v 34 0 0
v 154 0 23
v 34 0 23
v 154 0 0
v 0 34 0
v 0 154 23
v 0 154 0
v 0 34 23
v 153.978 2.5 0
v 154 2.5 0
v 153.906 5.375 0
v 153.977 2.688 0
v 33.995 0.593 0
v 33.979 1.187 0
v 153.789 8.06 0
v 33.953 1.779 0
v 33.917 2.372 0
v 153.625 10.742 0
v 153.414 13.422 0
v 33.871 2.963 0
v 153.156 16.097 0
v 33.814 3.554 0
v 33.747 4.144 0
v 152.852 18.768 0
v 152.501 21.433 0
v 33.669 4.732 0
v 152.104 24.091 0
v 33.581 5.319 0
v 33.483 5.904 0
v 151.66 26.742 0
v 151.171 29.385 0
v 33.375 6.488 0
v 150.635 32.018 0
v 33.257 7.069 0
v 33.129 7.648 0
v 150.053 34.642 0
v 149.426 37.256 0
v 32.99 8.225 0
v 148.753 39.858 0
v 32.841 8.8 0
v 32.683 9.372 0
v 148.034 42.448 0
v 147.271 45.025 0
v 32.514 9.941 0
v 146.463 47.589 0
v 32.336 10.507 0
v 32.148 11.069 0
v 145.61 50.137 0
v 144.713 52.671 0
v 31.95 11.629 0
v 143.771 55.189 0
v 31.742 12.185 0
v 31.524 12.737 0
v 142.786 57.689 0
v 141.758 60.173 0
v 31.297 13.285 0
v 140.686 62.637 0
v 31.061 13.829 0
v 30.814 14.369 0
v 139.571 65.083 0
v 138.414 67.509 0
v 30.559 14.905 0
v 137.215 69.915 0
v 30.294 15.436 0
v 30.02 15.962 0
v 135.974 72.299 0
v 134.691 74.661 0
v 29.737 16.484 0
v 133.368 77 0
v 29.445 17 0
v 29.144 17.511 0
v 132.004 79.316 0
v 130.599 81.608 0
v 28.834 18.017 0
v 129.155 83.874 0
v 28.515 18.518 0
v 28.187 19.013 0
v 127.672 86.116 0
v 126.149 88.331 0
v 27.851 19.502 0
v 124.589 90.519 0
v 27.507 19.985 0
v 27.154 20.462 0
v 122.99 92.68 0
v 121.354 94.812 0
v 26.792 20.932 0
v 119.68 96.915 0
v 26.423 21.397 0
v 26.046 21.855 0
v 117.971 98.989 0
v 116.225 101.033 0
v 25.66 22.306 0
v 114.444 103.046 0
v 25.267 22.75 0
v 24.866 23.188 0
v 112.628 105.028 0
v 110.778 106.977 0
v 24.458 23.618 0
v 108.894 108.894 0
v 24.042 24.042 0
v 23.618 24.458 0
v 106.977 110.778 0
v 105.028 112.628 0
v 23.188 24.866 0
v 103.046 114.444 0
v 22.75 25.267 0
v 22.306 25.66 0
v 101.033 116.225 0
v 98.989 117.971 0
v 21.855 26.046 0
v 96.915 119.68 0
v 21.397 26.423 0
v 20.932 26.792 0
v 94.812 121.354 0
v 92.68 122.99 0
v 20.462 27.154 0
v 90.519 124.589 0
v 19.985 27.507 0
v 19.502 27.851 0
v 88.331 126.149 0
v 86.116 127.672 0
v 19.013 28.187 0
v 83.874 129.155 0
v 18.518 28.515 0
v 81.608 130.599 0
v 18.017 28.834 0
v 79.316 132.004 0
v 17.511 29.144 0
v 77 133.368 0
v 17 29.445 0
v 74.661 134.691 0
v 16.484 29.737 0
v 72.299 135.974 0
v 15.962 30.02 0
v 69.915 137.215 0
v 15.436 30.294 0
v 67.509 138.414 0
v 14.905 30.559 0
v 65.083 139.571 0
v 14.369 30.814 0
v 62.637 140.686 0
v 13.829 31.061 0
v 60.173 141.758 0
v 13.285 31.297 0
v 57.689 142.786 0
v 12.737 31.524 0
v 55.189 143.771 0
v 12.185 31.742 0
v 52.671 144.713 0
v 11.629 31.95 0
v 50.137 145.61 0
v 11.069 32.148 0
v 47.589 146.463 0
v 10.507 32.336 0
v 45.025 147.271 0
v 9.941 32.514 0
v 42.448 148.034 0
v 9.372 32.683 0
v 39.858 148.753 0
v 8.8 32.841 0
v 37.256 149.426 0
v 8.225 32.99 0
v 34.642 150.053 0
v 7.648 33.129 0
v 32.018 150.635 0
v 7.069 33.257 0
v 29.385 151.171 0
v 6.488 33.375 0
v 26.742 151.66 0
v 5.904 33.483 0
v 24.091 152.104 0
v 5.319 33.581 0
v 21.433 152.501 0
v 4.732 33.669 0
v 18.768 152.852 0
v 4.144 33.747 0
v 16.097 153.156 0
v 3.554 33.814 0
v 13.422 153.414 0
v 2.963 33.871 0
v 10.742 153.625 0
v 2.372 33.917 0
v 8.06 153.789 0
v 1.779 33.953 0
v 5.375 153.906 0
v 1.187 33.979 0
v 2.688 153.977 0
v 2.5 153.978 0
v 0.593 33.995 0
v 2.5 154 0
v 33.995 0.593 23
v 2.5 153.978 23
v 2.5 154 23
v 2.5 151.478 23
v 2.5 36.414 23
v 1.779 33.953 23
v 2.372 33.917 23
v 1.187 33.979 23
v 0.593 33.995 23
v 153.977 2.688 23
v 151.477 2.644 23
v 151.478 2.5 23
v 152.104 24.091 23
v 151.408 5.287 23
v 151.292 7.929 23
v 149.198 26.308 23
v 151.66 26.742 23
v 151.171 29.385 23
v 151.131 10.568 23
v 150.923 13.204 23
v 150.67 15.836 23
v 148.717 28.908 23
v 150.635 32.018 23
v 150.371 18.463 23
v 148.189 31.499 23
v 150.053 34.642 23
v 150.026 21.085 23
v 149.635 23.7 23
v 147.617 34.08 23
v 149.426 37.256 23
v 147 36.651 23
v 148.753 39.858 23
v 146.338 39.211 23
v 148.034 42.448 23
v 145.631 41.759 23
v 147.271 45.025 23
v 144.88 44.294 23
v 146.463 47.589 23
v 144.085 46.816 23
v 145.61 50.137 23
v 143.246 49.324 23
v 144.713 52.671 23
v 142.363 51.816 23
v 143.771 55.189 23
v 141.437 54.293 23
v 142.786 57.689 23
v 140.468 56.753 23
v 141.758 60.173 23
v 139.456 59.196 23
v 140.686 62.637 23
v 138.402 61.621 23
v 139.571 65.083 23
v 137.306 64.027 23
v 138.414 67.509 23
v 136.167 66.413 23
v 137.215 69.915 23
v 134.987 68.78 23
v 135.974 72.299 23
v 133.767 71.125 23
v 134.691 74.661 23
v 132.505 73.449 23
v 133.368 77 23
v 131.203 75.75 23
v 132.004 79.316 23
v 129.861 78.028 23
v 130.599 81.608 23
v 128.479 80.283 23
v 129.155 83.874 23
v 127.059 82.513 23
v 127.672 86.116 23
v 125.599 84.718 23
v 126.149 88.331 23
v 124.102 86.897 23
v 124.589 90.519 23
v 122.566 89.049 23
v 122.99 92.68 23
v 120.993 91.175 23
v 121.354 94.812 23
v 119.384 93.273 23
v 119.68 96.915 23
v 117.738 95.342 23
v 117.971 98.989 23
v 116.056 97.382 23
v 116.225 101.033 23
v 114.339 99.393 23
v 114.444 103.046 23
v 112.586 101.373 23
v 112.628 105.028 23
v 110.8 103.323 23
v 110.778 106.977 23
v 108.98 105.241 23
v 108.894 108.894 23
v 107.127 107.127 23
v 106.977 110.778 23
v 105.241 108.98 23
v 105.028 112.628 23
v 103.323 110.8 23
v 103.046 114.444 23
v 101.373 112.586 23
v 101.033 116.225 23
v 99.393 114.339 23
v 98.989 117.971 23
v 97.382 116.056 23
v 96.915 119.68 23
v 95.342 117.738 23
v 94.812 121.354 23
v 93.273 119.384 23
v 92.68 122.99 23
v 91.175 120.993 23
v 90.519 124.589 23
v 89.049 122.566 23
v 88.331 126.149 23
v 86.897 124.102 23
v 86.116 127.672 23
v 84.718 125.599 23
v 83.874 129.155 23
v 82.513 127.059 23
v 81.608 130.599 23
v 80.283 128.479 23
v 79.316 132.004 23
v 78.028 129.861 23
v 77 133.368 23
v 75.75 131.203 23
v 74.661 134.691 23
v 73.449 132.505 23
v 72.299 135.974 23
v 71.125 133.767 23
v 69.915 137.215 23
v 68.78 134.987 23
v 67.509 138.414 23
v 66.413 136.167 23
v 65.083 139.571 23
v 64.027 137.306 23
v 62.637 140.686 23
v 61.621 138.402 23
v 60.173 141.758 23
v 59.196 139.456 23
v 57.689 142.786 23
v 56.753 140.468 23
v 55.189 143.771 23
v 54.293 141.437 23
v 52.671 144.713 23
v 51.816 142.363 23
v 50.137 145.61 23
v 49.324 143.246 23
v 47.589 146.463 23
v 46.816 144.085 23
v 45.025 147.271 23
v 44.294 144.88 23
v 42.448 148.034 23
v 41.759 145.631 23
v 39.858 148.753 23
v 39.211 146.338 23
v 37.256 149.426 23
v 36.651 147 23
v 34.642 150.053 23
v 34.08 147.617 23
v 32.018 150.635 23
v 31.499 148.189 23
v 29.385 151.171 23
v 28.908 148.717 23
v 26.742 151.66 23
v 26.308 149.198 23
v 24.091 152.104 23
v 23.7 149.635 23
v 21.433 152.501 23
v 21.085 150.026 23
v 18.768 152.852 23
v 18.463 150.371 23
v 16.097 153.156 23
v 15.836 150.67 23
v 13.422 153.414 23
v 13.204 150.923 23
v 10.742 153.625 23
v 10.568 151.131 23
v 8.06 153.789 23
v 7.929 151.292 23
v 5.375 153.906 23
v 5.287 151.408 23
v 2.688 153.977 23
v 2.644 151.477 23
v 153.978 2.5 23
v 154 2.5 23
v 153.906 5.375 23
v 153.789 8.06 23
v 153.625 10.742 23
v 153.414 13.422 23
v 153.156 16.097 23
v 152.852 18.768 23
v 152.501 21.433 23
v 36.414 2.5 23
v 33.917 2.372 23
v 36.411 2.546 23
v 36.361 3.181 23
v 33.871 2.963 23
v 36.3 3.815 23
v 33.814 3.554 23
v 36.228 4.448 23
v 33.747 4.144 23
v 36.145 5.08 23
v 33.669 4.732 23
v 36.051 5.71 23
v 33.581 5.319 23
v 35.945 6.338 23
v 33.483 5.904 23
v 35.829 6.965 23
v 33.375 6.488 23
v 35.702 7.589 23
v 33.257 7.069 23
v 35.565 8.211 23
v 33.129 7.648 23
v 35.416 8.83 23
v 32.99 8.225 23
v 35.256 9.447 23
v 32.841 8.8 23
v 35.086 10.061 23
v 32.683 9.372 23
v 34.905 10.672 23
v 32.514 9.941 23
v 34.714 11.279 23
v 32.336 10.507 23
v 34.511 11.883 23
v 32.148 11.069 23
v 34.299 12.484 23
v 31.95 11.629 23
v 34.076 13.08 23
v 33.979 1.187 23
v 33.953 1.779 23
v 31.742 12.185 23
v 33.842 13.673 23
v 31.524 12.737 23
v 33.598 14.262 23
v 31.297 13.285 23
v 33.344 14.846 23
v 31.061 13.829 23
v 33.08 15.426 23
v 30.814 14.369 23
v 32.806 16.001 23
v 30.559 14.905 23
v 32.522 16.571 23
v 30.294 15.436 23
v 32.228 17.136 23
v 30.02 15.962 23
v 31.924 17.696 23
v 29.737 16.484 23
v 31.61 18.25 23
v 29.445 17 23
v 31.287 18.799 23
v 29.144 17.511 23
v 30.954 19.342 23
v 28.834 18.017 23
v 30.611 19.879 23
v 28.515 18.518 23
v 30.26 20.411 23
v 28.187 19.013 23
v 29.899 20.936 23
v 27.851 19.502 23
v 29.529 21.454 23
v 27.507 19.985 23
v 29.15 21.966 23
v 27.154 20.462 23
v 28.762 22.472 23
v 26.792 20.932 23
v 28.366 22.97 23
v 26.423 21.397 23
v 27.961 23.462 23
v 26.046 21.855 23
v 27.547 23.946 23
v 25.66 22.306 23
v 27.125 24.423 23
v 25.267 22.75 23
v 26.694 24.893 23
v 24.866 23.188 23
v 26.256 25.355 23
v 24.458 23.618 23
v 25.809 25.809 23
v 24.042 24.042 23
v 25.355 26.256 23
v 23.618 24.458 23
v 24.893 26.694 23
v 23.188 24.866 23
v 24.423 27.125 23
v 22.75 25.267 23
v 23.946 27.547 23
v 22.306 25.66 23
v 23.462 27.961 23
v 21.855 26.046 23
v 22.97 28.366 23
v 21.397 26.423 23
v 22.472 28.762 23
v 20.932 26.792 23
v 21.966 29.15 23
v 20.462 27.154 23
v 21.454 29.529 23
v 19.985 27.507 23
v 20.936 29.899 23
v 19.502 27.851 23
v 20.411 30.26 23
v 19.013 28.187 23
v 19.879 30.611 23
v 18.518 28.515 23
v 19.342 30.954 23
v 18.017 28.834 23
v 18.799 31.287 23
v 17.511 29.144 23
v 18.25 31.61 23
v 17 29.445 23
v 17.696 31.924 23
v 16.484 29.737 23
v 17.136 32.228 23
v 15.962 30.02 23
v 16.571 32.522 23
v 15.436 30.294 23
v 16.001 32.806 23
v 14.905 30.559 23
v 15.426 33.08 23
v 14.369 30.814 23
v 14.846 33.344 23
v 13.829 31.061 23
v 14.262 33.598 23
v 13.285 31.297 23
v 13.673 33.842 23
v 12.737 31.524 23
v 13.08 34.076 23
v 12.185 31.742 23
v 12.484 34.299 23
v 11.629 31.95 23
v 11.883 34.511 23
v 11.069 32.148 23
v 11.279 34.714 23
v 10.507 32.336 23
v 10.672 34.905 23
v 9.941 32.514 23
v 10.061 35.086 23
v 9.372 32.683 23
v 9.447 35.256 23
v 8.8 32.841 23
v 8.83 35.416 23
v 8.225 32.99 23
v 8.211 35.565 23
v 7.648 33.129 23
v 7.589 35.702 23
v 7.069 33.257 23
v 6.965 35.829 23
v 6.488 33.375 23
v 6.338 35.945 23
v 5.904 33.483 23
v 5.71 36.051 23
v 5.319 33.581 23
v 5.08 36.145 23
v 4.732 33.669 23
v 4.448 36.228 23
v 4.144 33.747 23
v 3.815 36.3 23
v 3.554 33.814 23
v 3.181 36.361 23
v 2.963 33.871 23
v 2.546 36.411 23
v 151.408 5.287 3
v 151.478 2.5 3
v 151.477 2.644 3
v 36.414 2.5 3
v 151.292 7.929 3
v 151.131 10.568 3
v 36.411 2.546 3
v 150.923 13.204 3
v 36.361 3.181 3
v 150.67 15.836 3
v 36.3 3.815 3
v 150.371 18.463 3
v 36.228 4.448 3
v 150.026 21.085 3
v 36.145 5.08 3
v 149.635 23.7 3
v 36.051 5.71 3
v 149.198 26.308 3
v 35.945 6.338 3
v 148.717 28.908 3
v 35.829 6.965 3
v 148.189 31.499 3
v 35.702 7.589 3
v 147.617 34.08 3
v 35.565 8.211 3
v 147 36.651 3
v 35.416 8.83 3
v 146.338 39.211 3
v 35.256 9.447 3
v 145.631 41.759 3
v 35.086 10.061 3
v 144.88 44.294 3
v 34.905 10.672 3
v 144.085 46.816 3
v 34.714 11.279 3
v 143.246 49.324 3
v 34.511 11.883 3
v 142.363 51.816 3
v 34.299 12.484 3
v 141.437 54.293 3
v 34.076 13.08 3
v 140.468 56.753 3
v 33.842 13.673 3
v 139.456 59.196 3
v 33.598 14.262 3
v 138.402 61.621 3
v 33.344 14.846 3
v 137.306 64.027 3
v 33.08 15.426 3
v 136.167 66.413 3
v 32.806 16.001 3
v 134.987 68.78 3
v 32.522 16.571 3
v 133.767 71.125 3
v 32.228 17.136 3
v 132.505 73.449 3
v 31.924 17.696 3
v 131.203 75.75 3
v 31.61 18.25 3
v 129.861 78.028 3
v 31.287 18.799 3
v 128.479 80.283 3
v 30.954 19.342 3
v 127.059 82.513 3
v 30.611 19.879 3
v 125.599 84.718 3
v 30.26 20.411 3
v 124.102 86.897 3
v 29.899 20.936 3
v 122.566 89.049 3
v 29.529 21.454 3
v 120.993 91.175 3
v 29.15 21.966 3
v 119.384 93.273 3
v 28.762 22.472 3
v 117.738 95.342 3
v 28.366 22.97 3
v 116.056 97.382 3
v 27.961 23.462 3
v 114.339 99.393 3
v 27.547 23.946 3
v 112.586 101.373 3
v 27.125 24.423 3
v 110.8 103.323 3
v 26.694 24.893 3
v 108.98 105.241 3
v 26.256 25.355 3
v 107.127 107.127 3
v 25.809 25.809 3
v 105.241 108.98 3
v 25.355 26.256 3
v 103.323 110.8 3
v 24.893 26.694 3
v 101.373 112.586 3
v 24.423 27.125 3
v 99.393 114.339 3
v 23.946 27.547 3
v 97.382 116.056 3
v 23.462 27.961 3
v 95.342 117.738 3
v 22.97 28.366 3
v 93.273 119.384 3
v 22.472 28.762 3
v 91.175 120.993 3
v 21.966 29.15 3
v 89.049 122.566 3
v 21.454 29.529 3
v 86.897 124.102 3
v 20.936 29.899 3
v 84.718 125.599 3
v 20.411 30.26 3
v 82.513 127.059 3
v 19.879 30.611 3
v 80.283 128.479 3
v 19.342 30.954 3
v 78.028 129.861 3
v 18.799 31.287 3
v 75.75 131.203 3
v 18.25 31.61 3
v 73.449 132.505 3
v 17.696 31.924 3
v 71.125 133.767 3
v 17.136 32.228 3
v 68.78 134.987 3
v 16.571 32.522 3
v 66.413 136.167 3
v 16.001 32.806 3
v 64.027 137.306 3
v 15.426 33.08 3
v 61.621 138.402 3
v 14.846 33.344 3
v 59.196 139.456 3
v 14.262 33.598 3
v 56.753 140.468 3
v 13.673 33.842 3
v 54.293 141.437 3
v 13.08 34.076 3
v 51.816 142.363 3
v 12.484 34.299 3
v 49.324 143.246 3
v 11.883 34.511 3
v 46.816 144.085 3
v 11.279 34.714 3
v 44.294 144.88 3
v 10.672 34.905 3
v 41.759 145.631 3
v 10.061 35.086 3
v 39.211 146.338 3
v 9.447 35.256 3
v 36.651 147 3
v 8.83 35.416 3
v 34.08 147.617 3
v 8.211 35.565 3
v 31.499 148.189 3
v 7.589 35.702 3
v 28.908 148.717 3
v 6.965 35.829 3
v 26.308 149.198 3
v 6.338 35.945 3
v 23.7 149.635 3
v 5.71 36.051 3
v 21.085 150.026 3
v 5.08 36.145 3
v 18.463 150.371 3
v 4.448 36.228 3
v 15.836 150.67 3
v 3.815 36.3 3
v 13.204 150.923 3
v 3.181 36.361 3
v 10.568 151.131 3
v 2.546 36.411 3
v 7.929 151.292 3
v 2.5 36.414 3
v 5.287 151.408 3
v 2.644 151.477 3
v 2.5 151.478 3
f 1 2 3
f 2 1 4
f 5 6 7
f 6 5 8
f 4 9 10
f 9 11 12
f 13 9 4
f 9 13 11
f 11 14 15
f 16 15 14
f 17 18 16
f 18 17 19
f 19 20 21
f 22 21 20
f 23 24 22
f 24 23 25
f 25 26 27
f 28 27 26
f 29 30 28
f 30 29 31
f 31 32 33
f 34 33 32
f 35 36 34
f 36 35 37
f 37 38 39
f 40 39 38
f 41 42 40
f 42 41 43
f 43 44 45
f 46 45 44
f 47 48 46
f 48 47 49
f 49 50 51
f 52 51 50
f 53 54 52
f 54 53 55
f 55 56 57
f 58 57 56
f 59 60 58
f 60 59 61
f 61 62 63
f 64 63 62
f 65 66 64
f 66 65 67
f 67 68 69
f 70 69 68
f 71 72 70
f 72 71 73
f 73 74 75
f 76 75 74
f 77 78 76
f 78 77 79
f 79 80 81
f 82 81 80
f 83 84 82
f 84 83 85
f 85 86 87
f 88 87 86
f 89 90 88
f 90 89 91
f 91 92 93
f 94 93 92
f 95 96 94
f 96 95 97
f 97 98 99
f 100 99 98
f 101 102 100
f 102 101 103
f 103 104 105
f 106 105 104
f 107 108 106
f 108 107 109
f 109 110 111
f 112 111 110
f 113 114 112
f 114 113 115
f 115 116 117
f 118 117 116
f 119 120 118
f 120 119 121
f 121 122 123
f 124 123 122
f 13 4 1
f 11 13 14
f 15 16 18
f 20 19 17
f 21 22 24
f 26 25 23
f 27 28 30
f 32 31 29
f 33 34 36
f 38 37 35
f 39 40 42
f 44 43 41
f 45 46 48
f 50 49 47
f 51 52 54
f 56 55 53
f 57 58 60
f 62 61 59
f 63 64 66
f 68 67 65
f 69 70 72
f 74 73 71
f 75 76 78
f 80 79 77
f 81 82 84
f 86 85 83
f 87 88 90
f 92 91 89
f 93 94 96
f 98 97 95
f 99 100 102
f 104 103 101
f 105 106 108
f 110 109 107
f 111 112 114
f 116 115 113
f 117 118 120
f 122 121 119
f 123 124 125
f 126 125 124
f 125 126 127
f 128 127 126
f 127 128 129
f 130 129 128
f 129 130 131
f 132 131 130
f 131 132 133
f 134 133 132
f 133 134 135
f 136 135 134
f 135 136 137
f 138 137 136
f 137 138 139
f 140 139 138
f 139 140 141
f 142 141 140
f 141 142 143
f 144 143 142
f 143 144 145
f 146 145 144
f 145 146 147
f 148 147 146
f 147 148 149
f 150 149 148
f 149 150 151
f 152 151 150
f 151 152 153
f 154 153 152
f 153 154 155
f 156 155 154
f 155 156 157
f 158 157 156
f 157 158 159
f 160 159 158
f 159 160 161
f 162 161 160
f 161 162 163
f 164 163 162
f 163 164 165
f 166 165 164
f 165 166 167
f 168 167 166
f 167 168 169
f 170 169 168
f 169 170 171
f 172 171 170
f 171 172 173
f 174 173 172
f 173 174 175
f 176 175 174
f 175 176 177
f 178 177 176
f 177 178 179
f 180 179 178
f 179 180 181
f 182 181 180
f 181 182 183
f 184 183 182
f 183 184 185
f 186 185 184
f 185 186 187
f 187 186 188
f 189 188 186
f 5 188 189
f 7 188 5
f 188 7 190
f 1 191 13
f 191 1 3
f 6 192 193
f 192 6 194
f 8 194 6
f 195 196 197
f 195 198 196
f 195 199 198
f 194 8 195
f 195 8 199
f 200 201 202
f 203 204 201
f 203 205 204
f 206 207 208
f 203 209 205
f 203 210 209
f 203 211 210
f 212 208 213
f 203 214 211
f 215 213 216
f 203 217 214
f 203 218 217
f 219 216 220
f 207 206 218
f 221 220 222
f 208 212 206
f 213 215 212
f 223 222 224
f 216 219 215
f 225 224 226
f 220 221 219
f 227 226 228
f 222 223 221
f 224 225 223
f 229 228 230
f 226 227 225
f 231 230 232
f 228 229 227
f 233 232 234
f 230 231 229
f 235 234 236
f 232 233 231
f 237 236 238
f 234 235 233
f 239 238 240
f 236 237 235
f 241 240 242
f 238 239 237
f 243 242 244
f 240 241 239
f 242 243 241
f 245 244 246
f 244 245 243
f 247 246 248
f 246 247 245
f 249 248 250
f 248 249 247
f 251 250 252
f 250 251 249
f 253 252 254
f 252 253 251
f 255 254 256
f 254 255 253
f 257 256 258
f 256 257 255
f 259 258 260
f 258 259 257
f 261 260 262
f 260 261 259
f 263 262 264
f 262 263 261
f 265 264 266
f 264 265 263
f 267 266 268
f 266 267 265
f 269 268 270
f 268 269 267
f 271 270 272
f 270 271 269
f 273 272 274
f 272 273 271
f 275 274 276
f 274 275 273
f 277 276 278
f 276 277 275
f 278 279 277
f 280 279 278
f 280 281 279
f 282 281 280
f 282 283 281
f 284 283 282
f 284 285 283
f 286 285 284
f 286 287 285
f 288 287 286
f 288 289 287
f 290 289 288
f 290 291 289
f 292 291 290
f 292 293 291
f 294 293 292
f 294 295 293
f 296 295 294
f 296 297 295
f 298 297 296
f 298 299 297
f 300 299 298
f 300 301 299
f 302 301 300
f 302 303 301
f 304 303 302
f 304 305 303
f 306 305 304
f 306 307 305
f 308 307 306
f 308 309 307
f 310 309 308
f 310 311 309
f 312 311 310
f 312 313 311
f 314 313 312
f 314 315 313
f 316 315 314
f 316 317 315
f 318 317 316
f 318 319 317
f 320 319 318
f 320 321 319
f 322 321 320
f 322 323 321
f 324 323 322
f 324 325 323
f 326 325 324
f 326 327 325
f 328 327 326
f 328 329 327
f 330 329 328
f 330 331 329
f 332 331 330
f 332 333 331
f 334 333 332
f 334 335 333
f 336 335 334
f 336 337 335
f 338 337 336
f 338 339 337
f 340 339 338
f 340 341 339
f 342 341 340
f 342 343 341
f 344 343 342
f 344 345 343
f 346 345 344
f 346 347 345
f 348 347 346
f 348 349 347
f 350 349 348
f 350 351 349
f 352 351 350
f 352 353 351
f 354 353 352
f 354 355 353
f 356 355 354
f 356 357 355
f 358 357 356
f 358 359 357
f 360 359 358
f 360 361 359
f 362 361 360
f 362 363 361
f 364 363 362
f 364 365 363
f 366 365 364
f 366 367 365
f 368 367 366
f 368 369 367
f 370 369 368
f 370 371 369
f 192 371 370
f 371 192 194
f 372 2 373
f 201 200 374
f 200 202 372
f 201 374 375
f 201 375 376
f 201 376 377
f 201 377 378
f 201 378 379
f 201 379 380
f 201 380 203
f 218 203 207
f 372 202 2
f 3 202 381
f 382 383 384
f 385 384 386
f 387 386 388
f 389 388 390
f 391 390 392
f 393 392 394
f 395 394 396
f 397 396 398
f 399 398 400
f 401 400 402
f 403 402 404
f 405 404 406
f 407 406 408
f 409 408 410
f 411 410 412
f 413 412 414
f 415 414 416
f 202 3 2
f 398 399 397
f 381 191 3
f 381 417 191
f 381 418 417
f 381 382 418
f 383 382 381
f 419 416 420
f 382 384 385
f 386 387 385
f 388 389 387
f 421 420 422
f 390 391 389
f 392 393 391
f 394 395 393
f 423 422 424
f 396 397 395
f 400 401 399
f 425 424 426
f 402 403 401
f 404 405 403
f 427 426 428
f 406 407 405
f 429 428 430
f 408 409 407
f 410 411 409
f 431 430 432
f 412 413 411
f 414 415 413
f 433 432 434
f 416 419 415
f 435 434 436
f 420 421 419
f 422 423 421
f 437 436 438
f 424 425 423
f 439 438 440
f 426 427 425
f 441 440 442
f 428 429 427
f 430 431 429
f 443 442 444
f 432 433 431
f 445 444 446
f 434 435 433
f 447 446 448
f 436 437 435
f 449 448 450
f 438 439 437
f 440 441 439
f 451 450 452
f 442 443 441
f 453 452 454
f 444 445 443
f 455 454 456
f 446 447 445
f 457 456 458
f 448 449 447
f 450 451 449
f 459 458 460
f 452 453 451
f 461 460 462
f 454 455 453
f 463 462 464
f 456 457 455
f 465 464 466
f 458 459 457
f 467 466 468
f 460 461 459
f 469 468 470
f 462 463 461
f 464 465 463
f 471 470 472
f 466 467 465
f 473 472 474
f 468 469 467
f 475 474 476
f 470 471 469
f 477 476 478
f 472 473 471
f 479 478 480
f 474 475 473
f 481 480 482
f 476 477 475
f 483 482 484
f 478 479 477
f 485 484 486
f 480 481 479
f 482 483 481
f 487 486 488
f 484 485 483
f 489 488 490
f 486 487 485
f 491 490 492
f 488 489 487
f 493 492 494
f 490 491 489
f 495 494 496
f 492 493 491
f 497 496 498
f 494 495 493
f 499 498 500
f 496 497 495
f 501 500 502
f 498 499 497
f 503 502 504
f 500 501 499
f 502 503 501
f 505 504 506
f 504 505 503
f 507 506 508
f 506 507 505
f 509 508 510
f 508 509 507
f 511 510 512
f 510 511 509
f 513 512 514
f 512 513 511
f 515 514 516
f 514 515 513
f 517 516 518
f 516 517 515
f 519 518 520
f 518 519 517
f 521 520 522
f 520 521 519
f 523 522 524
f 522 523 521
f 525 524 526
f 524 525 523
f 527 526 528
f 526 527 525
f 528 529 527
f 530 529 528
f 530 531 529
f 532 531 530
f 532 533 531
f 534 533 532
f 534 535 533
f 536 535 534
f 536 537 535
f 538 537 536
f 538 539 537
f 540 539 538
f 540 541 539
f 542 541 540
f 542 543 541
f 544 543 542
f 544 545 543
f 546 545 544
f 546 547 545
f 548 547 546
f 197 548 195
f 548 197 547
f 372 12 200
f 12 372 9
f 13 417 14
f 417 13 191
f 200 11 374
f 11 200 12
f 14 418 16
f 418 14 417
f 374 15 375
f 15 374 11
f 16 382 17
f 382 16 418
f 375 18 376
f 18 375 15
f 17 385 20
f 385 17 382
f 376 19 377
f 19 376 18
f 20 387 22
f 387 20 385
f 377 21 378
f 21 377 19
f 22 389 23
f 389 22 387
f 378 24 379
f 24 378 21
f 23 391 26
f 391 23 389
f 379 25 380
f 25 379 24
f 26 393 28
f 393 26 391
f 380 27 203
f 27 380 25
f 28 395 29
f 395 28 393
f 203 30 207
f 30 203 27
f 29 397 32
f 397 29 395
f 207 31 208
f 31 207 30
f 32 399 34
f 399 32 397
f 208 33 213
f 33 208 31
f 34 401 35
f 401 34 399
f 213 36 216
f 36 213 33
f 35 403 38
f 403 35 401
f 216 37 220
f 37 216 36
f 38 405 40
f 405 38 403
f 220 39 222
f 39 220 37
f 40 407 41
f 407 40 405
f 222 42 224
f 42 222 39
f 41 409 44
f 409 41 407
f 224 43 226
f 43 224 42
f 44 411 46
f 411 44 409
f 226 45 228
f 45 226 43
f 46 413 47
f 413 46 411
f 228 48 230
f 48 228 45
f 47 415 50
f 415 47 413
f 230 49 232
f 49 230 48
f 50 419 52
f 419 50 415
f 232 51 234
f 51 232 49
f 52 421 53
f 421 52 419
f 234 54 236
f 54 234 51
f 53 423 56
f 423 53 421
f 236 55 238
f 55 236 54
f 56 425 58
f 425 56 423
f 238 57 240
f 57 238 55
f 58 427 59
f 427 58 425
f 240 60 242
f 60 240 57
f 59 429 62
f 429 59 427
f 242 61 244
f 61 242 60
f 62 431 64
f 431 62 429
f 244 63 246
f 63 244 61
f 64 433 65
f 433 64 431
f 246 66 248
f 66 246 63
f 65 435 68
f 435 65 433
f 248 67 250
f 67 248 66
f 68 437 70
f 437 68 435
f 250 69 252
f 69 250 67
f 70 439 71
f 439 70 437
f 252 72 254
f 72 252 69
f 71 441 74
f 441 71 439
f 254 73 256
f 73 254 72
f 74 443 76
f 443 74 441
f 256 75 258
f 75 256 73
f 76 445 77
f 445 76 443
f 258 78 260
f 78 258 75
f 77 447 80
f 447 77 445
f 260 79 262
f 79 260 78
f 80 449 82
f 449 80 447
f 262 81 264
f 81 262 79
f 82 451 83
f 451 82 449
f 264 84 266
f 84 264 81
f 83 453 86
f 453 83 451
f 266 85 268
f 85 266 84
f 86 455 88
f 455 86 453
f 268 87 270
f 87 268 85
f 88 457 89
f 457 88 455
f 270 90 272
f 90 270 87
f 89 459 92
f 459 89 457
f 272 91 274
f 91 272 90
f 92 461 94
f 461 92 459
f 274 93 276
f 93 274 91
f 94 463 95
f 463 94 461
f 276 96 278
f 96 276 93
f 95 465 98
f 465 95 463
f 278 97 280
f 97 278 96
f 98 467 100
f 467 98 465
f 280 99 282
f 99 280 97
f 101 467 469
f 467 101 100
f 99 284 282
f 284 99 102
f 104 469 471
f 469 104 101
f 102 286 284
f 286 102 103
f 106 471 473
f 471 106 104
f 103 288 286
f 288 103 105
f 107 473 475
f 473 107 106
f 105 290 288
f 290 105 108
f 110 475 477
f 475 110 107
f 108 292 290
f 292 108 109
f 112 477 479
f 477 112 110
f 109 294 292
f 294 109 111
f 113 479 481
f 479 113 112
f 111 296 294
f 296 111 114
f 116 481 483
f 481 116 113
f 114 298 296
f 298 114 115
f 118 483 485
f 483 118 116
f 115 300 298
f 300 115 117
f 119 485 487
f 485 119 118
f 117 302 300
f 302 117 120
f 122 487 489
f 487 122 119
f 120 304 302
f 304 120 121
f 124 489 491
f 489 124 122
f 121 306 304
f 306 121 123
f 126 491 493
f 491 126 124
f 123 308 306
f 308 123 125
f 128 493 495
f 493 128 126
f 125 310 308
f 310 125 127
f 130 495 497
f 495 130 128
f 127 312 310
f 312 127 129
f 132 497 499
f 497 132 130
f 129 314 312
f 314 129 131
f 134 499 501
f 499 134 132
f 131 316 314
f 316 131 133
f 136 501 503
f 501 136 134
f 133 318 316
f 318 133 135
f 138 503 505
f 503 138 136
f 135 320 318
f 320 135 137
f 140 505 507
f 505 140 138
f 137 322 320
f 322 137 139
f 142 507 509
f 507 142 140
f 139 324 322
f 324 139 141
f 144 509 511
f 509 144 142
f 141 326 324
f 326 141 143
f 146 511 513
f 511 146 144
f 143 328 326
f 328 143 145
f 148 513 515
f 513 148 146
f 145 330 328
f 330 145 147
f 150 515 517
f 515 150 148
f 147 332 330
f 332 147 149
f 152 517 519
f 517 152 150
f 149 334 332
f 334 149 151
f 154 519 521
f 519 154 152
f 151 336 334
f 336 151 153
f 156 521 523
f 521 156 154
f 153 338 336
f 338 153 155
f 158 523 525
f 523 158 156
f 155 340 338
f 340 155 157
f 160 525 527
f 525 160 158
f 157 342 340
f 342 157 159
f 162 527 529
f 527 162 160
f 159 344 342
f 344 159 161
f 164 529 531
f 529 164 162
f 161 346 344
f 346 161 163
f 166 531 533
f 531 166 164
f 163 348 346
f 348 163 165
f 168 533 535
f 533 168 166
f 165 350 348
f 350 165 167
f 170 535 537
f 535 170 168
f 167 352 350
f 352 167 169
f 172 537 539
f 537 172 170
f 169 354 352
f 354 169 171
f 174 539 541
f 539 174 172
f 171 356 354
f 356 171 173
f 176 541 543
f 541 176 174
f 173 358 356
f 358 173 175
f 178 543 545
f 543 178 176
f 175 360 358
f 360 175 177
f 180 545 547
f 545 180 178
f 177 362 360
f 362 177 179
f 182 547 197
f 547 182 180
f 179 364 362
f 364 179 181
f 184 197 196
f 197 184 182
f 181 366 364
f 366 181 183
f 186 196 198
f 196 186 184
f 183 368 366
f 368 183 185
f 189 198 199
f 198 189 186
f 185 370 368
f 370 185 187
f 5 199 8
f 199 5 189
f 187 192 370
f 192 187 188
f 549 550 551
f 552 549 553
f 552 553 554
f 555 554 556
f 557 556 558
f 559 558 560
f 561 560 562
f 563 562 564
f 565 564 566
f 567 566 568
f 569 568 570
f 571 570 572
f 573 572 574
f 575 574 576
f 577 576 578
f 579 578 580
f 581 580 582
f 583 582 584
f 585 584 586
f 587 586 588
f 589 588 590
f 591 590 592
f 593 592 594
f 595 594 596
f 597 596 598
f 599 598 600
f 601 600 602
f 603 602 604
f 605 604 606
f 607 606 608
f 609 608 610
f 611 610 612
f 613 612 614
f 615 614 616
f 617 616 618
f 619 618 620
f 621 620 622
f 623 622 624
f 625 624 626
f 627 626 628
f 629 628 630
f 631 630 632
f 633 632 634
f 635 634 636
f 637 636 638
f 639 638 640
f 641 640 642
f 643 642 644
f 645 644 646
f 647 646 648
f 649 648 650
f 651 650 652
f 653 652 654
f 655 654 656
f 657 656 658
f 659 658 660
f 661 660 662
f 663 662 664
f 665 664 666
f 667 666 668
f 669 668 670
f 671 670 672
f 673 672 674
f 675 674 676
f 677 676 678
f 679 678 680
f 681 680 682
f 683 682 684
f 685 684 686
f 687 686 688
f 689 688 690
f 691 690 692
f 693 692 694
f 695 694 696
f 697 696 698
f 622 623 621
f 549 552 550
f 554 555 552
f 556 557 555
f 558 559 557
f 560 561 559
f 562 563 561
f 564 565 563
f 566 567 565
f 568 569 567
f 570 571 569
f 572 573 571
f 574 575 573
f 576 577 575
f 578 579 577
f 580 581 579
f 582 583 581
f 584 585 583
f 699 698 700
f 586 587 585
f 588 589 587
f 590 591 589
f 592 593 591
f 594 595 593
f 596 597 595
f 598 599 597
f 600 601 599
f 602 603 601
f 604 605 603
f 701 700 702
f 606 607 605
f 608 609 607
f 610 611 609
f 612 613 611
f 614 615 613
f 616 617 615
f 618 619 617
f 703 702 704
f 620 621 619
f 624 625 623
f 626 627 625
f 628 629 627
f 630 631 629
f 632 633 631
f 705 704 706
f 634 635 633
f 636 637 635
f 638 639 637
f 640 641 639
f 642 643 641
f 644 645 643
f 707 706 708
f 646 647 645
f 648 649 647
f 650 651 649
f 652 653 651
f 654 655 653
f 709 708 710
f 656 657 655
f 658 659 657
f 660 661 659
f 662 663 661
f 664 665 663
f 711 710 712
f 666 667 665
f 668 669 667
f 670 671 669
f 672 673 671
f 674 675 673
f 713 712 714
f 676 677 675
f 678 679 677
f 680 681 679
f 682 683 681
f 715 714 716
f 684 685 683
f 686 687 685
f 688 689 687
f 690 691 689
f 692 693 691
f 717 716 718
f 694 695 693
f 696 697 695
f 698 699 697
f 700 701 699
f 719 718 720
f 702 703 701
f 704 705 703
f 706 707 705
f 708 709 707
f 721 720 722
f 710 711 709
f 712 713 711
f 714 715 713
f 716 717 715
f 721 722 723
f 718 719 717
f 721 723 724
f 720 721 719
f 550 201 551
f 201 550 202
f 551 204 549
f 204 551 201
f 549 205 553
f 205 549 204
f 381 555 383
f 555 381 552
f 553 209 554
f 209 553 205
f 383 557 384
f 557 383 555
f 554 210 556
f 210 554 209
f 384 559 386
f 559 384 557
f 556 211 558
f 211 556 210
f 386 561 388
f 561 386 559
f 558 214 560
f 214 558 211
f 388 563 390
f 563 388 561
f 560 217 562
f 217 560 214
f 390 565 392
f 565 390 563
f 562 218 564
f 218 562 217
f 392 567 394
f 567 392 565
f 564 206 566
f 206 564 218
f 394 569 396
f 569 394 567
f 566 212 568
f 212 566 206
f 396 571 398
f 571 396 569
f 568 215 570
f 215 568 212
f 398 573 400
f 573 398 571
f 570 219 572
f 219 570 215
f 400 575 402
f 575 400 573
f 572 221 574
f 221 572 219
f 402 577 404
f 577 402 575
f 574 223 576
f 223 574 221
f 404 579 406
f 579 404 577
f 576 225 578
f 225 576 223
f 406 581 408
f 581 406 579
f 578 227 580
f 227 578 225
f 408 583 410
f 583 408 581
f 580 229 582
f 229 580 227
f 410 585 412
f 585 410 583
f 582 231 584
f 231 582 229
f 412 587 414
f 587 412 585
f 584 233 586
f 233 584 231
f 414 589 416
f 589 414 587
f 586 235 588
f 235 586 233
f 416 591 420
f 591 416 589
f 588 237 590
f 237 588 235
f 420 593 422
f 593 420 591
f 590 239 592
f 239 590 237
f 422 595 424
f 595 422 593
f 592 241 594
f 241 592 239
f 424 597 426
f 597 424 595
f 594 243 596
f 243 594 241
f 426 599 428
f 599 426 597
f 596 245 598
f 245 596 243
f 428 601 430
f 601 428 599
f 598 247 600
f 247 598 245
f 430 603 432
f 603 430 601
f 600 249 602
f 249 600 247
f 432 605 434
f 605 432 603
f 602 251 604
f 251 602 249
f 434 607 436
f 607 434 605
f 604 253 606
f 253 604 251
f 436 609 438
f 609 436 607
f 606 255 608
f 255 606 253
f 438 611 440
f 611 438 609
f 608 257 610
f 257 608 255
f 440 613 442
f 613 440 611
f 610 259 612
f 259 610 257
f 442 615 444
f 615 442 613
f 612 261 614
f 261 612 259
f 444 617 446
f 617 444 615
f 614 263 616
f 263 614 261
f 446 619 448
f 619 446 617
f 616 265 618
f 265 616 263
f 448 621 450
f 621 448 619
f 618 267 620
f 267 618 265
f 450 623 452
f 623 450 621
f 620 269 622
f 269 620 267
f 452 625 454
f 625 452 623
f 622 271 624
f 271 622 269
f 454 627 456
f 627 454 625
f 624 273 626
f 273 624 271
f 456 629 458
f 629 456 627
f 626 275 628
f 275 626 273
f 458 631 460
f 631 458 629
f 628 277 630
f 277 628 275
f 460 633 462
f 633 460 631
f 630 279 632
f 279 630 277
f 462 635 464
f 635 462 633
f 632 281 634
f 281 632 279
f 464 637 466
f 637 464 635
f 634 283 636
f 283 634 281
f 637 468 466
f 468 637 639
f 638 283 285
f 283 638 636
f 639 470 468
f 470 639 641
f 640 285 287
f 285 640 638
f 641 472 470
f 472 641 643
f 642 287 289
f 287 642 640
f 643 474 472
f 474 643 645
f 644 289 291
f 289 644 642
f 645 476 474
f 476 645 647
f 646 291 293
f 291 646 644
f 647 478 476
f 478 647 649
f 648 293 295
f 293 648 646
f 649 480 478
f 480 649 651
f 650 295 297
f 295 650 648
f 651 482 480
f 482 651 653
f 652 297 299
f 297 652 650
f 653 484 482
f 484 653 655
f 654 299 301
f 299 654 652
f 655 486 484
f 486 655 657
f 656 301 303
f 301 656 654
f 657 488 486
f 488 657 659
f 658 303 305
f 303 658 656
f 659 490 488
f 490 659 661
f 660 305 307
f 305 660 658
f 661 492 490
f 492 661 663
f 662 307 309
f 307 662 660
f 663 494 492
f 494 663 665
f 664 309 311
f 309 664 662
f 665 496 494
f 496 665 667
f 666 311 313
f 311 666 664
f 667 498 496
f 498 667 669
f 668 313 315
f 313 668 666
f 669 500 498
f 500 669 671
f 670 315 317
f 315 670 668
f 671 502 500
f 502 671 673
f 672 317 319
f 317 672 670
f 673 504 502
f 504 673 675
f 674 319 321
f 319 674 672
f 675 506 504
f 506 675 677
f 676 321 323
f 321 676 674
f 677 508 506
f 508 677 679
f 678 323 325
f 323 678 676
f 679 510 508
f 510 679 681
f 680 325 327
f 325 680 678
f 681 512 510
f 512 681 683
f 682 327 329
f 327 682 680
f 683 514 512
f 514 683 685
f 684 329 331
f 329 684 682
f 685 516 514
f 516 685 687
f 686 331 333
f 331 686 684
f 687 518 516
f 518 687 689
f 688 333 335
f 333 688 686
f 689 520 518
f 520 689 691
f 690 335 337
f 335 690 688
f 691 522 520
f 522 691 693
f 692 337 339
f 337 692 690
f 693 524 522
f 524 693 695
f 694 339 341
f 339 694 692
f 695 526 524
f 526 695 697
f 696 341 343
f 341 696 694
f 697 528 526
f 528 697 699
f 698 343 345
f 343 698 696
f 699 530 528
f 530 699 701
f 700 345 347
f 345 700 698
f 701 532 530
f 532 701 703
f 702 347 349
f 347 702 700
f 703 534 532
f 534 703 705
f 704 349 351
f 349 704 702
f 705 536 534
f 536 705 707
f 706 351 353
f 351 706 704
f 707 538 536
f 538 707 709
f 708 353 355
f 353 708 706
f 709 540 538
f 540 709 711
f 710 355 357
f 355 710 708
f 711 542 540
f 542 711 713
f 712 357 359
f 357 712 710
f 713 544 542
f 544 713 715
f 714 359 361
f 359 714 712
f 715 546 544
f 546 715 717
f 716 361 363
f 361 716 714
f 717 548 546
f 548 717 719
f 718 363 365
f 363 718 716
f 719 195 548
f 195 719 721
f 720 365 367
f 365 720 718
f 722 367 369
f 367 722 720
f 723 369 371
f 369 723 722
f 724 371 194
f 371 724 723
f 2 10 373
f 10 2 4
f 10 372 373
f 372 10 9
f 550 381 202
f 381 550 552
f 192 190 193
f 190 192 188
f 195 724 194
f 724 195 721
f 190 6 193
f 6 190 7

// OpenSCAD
/*&&&&&&&&&&&&&&&&&&&&&&&&&&&&&&&&&&&&&&&&&&&&&&&&&&&&&&&&&&&&&&&&&
&&  SpringFactory: desiccant_tray.scad

        Copyright (c) 2022, Jeff Hessenflow
        All rights reserved.
        
        https://github.com/jshessen/desiccant_tray
&&
&&&&&&&&&&&&&&&&&&&&&&&&&&&&&&&&&&&&&&&&&&&&&&&&&&&&&&&&&&&&&&&&&*/

/*&&&&&&&&&&&&&&&&&&&&&&&&&&&&&&&&&&&&&&&&&&&&&&&&&&&&&&&&&&&&&&&&&
&&  GNU GPLv3
&&
This program is free software: you can redistribute it and/or modify it under
the terms of the GNU General Public License as published by the Free Software
Foundation, either version 3 of the License, or (at your option) any later
version.

This program is distributed in the hope that it will be useful, but WITHOUT
ANY WARRANTY; without even the implied warranty of MERCHANTABILITY or FITNESS
FOR A PARTICULAR PURPOSE. See the GNU General Public License for more details.

You should have received a copy of the GNU General Public License along with
this program. If not, see <https://www.gnu.org/licenses/>.
&&
&&&&&&&&&&&&&&&&&&&&&&&&&&&&&&&&&&&&&&&&&&&&&&&&&&&&&&&&&&&&&&&&&*/





use <MCAD/regular_shapes.scad>;





/*?????????????????????????????????????????????????????????????????
??
/*???????????????????????????????????????????????????????
?? Section: Customizer
??
    Description:
        The Customizer feature provides a graphic user interface for editing model parameters.
??
???????????????????????????????????????????????????????*/
/* [Global] */
//Display Verbose Output?
$VERBOSE=1; // [1:Yes,0:No]

/* [Tray Dimensions] */
//Tray Diameter (X)
CUSTOM_TRAY_DIAMETER=0;     // [1:.1:250]
//Tray Height (Z)
CUSTOM_TRAY_HEIGHT=0;       // [1:.1:210]
//Center Diameter (X)
CUSTOM_CENTER_DIAMETER=0;   // [1:.1:210]
//Wall Width (X)
CUSTOM_WALL_WIDTH=0;        // [.1:.1:250]
//Floor Depth (Z)
CUSTOM_FLOOR_DEPTH=0;       // [.1:.1:210]
//Number of Tray Sections
CUSTOM_TRAY_SECTIONS=0;     // [1:1:20]
/* [Misc] */
/*
?????????????????????????????????????????????????????????????????*/





/*%%%%%%%%%%%%%%%%%%%%%%%%%%%%%%%%%%%%%%%%%%%%%%%%%%%%%%%%%%%%%%%%%
%% Section: Defined/Derived Variables
*/
/* [Hidden] */
$fa = 0.3;
$fs = 0.3;

/*
If the corresponding input variable is set to zero (0), define the working values relative to the PIPE_ID
*/
diameter=(CUSTOM_TRAY_DIAMETER==0) ? 308 : CUSTOM_TRAY_DIAMETER;
radius=diameter/2;
hole=(CUSTOM_CENTER_DIAMETER==0) ? 68 : CUSTOM_TRAY_DIAMETER;
hole_radius=hole/2;
height=(CUSTOM_TRAY_HEIGHT==0) ? 23 : CUSTOM_TRAY_HEIGHT;
wall=(CUSTOM_WALL_WIDTH==0) ? 2.5 : CUSTOM_WALL_WIDTH;
floor=(CUSTOM_FLOOR_DEPTH==0) ? 3 : CUSTOM_FLOOR_DEPTH;
angle=(CUSTOM_TRAY_SECTIONS==0) ? 90 : 360/CUSTOM_TRAY_SECTIONS;

if($VERBOSE) echo(str("**======> Tray Diameter: ",diameter,"**"));
if($VERBOSE) echo(str("**======> Hole Diameter: ",hole,"**"));
if($VERBOSE) echo(str("**======> Tray Wall Height: ",height,"**"));
if($VERBOSE) echo(str("**======> Wall Width: ",wall,"**"));
if($VERBOSE) echo(str("**======> Floor Depth: ",floor,"**"));
/*
%%%%%%%%%%%%%%%%%%%%%%%%%%%%%%%%%%%%%%%%%%%%%%%%%%%%%%%%%%%%%%%%%*/





/*/////////////////////////////////////////////////////////////////
// Section: Modules
*/
/*///////////////////////////////////////////////////////
// Module: make_dessicant_tray()
//
    Description:
        Wrapper module to create desiccant_tray object

    Arguments:
        N/A
*/
make_dessicant_tray();
///////////////////////////////////////////////////////*/
module make_dessicant_tray(){
    // Create Tray Shape
    rotate([0,0,180]){
        hollow_shape(){
            make_shape(radius,hole_radius,height, angle=angle);
            translate([0,0,floor])
                make_shape(radius-wall,hole_radius+wall,height, angle=angle);
        }
    }
    // Recreate Wall Segments (X/Y)
    translate([hole_radius,0,0]) cube([radius-hole_radius,wall,height]);
    translate([0,hole_radius,0]) cube([wall,radius-hole_radius,height]);
}
///////////////////////////////////////////////////////*/

/////////////////////////////////////////////////////////
module make_shape(radius,hole_radius,height, angle=90) {
    r=radius-hole_radius;
    translate([0,0,height/2]) rotate_extrude(angle=angle, $fn=360)
        translate([-((r/2)+hole_radius),0,0]) square([r,height],center=true);
}
module hollow_shape(wall,floor) {
    difference(){
        children(0);
        children(1);
    }
}
module mirror_copy(vec=[0,1,0]) {
    children();
    mirror(vec) children();
}
///////////////////////////////////////////////////////*/
/*
/////////////////////////////////////////////////////////////////*/
